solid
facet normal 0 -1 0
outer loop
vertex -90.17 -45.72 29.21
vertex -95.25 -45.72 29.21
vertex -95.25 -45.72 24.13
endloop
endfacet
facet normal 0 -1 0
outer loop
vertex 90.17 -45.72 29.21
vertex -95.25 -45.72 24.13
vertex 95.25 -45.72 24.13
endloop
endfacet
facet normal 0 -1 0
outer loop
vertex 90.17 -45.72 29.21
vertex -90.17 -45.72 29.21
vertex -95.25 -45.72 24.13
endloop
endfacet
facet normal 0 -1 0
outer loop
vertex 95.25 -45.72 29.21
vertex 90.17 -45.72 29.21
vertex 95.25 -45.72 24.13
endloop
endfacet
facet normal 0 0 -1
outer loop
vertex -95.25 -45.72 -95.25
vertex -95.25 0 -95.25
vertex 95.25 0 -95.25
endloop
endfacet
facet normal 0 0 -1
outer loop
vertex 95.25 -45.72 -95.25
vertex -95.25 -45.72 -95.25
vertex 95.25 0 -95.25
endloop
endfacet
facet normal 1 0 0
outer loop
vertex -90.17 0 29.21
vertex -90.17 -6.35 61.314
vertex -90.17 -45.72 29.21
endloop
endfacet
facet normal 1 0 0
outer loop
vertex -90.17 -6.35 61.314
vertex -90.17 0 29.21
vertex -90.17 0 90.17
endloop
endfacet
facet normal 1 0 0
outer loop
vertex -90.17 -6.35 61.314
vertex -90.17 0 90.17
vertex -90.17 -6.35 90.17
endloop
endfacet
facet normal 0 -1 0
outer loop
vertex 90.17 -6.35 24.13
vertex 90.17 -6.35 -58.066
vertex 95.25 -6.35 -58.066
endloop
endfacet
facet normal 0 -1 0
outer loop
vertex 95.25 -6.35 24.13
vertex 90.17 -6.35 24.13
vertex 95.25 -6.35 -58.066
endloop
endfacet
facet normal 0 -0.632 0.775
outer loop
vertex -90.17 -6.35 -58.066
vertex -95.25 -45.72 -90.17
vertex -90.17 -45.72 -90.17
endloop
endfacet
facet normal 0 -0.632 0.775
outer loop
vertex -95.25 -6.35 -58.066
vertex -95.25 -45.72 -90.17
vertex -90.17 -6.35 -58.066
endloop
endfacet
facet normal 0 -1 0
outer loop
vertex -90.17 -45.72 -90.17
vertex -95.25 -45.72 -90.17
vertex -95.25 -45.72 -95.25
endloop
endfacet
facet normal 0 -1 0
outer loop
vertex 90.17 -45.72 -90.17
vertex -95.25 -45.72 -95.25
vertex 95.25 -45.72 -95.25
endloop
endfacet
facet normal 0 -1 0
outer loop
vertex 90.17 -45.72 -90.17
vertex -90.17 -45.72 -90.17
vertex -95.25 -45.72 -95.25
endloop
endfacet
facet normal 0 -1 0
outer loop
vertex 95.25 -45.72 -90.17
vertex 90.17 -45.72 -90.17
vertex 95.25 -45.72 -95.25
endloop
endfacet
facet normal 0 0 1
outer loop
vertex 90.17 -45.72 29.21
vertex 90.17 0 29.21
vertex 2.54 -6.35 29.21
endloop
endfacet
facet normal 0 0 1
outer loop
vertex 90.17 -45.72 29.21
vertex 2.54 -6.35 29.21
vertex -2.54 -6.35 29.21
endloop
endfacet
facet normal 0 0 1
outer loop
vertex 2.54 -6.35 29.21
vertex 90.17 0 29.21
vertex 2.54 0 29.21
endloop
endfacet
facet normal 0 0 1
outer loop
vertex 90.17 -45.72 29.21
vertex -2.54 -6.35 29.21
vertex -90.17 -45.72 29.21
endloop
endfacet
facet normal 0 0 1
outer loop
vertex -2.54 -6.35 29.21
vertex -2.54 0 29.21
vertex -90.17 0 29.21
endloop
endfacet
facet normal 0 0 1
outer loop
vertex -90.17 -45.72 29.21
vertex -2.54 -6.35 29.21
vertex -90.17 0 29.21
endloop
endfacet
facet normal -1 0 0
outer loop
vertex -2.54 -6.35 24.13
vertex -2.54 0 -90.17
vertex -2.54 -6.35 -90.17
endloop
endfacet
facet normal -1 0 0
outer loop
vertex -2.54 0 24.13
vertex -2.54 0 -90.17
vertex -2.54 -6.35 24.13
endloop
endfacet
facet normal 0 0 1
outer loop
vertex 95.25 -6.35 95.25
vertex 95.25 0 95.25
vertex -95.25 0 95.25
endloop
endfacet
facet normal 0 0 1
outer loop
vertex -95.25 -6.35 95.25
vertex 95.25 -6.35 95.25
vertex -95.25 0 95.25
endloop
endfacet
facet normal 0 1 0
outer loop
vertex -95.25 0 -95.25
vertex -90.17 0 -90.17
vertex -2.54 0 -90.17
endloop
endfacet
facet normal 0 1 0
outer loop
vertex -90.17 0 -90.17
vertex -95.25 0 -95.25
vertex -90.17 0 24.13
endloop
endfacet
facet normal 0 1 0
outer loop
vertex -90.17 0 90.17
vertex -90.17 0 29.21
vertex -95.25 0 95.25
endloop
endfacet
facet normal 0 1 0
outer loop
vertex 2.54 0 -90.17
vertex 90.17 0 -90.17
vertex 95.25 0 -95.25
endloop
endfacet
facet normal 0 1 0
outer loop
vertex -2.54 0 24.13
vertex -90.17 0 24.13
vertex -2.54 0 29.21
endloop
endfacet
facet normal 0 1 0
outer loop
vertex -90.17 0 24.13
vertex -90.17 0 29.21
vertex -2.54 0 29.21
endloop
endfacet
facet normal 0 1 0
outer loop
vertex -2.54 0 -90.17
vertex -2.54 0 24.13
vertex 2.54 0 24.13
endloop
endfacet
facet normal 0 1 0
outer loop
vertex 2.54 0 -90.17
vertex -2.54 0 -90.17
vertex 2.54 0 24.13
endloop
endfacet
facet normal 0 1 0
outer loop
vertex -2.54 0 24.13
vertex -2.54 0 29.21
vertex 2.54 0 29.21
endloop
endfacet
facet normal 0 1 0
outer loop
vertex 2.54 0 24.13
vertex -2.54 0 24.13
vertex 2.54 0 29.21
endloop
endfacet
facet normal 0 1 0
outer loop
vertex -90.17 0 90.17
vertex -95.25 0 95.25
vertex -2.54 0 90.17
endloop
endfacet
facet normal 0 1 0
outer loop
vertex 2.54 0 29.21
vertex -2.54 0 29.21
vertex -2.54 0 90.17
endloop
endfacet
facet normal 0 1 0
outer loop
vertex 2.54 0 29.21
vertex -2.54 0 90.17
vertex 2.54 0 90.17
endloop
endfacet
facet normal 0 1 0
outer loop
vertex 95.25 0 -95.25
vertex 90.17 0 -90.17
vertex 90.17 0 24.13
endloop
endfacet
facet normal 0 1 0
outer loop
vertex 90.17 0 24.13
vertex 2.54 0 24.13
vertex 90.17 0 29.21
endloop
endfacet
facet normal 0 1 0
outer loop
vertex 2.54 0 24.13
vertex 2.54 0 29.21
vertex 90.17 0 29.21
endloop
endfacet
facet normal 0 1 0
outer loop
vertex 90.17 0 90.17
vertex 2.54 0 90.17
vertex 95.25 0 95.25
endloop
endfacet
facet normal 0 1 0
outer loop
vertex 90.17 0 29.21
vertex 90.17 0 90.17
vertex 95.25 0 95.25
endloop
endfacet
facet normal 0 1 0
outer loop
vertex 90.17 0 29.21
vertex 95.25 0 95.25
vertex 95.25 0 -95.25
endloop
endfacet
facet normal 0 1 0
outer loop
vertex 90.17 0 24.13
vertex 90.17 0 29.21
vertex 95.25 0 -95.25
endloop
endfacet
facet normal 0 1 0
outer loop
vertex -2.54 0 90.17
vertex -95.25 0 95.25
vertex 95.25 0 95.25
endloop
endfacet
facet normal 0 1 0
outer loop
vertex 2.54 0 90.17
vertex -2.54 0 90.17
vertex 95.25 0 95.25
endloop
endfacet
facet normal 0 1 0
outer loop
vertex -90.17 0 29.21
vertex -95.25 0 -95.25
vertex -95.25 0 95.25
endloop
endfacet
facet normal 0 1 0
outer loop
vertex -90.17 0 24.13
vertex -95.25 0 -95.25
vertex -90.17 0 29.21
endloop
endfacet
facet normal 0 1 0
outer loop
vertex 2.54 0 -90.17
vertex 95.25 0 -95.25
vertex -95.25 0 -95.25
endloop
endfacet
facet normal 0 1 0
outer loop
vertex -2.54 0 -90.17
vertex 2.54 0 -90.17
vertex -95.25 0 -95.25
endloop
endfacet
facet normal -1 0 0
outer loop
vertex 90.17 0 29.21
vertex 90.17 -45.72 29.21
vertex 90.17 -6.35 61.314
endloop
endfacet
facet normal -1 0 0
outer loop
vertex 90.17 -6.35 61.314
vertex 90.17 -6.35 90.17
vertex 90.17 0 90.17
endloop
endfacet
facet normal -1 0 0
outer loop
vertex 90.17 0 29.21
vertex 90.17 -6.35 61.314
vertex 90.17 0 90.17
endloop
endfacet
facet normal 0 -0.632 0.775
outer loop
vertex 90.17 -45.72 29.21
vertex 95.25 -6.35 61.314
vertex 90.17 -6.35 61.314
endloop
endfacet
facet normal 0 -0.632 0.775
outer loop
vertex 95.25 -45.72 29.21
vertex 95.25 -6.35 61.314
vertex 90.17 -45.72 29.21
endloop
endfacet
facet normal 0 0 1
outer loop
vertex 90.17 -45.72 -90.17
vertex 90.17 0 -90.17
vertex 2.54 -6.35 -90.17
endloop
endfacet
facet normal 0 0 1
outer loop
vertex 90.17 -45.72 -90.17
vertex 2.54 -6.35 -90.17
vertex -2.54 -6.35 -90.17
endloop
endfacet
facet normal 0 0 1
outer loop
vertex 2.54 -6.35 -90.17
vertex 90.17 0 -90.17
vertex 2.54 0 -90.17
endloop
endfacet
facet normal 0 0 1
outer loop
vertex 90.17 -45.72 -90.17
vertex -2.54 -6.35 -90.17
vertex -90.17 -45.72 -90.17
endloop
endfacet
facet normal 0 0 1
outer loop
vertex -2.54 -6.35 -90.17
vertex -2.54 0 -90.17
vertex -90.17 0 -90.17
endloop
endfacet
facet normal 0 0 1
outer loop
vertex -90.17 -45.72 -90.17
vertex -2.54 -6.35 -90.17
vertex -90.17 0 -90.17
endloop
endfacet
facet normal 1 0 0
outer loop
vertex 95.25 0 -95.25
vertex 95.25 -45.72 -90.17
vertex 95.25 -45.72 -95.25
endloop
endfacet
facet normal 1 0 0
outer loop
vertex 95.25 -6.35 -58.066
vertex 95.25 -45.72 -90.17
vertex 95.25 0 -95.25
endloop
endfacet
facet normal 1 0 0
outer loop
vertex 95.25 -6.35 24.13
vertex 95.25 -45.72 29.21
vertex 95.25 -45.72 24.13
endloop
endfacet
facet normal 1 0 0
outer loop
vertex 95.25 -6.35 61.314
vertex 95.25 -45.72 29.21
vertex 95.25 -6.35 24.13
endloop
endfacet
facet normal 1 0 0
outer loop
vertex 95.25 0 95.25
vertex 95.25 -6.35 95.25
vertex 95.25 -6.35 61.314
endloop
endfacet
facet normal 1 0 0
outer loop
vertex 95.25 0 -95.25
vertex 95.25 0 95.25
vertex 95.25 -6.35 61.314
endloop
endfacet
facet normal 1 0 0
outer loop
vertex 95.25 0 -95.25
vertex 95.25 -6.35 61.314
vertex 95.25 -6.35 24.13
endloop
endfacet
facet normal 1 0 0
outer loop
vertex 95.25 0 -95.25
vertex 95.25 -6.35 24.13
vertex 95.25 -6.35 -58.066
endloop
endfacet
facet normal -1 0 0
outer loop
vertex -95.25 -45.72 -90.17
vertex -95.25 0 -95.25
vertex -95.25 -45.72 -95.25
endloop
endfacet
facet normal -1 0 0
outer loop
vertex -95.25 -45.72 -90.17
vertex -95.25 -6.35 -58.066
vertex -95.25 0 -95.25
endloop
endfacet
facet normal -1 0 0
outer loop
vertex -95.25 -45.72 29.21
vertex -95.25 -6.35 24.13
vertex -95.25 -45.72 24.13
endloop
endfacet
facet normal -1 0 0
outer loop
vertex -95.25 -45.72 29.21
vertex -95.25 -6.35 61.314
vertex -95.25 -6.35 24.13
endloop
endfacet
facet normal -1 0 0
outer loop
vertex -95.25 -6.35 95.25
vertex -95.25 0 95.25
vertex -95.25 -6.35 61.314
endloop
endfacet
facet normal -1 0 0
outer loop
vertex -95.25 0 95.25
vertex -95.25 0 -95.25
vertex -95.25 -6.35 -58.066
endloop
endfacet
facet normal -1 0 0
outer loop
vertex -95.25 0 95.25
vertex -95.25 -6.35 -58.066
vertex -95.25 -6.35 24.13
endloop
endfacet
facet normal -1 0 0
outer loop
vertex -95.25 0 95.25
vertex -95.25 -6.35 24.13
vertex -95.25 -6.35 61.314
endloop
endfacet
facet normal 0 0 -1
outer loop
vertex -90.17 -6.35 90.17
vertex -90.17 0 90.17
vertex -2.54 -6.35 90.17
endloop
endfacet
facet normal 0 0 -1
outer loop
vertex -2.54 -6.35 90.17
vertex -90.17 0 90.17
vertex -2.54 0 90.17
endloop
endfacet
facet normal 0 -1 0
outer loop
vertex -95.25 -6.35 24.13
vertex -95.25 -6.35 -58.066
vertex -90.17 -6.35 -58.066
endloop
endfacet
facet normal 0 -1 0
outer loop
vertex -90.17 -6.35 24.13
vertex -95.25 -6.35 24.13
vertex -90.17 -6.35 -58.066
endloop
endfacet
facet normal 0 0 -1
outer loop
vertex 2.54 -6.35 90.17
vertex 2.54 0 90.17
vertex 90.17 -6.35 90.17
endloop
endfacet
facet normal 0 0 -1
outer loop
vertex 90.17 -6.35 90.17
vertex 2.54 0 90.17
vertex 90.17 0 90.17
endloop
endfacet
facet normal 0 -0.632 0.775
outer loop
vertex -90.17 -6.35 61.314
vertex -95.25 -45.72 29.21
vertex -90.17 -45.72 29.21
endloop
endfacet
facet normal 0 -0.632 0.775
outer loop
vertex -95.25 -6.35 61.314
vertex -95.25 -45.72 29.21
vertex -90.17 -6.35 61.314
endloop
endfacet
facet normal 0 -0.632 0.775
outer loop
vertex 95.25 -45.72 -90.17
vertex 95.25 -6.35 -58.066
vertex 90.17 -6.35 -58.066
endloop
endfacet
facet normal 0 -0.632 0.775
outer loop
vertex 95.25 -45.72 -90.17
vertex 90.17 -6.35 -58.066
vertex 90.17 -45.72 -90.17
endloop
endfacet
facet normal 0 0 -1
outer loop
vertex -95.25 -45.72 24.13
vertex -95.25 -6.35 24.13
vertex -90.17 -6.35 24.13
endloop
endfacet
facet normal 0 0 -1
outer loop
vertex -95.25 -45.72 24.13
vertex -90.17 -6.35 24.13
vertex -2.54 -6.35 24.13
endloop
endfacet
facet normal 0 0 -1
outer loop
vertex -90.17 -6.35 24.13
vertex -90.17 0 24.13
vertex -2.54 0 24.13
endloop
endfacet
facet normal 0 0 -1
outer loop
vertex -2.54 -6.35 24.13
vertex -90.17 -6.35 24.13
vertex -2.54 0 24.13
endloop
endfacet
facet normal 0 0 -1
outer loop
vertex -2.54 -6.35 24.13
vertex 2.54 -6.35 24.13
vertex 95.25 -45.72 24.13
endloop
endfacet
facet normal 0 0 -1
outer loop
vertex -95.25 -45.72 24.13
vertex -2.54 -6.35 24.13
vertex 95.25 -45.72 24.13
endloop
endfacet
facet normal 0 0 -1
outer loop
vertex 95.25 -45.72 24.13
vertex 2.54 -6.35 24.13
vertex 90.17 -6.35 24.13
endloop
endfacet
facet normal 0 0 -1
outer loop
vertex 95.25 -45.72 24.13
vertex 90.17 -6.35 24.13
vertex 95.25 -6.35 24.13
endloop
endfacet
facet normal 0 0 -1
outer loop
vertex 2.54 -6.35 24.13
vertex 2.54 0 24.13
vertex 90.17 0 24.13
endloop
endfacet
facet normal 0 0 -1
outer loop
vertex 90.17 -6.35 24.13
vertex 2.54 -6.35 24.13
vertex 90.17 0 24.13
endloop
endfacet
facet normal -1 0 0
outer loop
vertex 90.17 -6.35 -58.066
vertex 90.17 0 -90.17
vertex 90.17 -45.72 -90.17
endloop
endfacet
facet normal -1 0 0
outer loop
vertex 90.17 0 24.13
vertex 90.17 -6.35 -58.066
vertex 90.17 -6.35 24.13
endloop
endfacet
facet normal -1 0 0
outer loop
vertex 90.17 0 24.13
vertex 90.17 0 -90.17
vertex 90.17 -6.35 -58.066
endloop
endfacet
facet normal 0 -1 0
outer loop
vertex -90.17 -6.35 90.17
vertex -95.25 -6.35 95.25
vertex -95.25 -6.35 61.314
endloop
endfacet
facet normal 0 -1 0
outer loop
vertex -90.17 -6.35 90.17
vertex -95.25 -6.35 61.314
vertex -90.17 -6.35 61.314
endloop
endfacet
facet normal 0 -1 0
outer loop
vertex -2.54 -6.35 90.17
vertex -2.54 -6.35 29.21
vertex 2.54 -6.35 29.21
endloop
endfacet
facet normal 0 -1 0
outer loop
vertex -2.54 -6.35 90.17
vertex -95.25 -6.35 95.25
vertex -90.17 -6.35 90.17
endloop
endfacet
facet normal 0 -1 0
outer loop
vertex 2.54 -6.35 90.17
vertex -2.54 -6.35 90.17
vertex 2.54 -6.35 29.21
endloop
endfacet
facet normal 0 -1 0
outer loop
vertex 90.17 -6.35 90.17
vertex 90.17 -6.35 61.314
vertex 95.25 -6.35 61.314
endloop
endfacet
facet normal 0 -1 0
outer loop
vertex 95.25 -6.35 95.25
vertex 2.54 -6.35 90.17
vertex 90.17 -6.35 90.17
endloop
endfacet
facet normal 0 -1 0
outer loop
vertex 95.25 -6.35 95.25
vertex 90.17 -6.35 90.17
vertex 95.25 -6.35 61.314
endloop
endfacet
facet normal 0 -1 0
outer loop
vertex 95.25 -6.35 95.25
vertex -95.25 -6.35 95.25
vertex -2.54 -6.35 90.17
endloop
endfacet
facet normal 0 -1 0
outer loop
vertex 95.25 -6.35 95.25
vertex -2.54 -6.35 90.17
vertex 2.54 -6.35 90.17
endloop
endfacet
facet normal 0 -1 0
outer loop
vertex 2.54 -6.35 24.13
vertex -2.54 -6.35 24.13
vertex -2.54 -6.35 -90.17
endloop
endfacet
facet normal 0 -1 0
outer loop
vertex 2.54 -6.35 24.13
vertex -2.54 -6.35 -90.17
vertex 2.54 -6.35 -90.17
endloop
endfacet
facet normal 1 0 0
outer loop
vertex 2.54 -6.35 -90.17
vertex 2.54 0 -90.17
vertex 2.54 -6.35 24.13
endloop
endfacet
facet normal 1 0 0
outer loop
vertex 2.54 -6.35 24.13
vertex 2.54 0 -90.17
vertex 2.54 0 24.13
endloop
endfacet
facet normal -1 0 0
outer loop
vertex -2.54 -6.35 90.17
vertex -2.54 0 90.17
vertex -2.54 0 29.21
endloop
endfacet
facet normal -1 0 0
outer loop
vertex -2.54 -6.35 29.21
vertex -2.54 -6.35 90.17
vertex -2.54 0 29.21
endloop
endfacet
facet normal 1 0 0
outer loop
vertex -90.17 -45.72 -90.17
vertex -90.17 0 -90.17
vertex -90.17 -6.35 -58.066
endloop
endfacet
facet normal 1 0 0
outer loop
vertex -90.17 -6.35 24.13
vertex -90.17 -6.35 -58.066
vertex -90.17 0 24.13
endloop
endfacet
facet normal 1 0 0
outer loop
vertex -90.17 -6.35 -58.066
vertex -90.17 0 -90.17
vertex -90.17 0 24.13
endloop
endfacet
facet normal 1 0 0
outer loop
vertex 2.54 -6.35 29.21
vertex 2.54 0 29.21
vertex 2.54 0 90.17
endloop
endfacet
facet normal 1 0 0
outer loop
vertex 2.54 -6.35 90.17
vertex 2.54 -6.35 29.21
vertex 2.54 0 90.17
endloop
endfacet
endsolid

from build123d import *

# Parameters (mm, degrees)
F1_DEPTH = 45.72
F0_W     = 5.08
F0_H     = 114.3
F2_DEPTH = 6.35
F5_DEPTH = 5.08
F7_DEPTH = 5.08


with BuildPart() as f1:
    # F0 (on Front) → F1 (new body)
    with BuildSketch(Plane.XZ):
        Polygon((-90.17, 29.21), (-95.25, 29.21), (-95.25, 24.13), (-90.17, 24.13), (-2.54, 24.13), (2.54, 24.13), (90.17, 24.13), (95.25, 24.13), (95.25, 29.21), (90.17, 29.21), (2.54, 29.21), (-2.54, 29.21), align=None)
    extrude(amount=F1_DEPTH)


with BuildPart() as f1b:
    # F0 (on Front) → F1, piece 2 (new body)
    with BuildSketch(Plane.XZ):
        Polygon((-90.17, -90.17), (-95.25, -90.17), (-95.25, -95.25), (95.25, -95.25), (95.25, -90.17), (90.17, -90.17), (2.54, -90.17), (-2.54, -90.17), align=None)
    extrude(amount=F1_DEPTH)


with BuildPart() as f2:
    # F0 (on Front) → F2 (new body)
    with BuildSketch(Plane.XZ):
        with Locations((-92.71, -33.02)):
            Rectangle(F0_W, F0_H)
    extrude(amount=F2_DEPTH)


with BuildPart() as f2b:
    # F0 (on Front) → F2, piece 2 (new body)
    with BuildSketch(Plane.XZ):
        Polygon((95.25, 95.25), (-95.25, 95.25), (-95.25, 29.21), (-90.17, 29.21), (-90.17, 90.17), (-2.54, 90.17), (-2.54, 29.21), (2.54, 29.21), (2.54, 90.17), (90.17, 90.17), (90.17, 29.21), (95.25, 29.21), align=None)
    extrude(amount=F2_DEPTH)


with BuildPart() as f2c:
    # F0 (on Front) → F2, piece 3 (new body)
    with BuildSketch(Plane.XZ):
        with Locations((0, -33.02)):
            Rectangle(F0_W, F0_H)
    extrude(amount=F2_DEPTH)


with BuildPart() as f2d:
    # F0 (on Front) → F2, piece 4 (new body)
    with BuildSketch(Plane.XZ):
        with Locations((92.71, -33.02)):
            Rectangle(F0_W, F0_H)
    extrude(amount=F2_DEPTH)


with BuildPart() as f1b_1:
    add(f1b.part)

    # F3: union F1, F2b, F2, F2d, F2c
    add(f1.part)
    add(f2b.part)
    add(f2.part)
    add(f2d.part)
    add(f2c.part)

    # F4 (on face) → F5 (join)
    with BuildSketch(Plane.YZ.offset(95.25)):
        Polygon((-6.35, 61.3136306358), (-45.72, 29.21), (-6.35, 29.21), align=None)
        Polygon((-6.35, -90.17), (-6.35, -58.0663693642), (-45.72, -90.17), align=None)
    extrude(amount=-F5_DEPTH)

    # F6 (on face) → F7 (join)
    with BuildSketch(Plane(origin=(-95.25, 0, 0), x_dir=(0, -1, 0), z_dir=(-1, 0, 0))):
        Polygon((6.35, 29.21), (45.72, 29.21), (6.35, 61.3136306358), align=None)
        Polygon((45.72, -90.17), (6.35, -58.0663693642), (6.35, -90.17), align=None)
    extrude(amount=-F7_DEPTH)


solid = f1b_1.part
